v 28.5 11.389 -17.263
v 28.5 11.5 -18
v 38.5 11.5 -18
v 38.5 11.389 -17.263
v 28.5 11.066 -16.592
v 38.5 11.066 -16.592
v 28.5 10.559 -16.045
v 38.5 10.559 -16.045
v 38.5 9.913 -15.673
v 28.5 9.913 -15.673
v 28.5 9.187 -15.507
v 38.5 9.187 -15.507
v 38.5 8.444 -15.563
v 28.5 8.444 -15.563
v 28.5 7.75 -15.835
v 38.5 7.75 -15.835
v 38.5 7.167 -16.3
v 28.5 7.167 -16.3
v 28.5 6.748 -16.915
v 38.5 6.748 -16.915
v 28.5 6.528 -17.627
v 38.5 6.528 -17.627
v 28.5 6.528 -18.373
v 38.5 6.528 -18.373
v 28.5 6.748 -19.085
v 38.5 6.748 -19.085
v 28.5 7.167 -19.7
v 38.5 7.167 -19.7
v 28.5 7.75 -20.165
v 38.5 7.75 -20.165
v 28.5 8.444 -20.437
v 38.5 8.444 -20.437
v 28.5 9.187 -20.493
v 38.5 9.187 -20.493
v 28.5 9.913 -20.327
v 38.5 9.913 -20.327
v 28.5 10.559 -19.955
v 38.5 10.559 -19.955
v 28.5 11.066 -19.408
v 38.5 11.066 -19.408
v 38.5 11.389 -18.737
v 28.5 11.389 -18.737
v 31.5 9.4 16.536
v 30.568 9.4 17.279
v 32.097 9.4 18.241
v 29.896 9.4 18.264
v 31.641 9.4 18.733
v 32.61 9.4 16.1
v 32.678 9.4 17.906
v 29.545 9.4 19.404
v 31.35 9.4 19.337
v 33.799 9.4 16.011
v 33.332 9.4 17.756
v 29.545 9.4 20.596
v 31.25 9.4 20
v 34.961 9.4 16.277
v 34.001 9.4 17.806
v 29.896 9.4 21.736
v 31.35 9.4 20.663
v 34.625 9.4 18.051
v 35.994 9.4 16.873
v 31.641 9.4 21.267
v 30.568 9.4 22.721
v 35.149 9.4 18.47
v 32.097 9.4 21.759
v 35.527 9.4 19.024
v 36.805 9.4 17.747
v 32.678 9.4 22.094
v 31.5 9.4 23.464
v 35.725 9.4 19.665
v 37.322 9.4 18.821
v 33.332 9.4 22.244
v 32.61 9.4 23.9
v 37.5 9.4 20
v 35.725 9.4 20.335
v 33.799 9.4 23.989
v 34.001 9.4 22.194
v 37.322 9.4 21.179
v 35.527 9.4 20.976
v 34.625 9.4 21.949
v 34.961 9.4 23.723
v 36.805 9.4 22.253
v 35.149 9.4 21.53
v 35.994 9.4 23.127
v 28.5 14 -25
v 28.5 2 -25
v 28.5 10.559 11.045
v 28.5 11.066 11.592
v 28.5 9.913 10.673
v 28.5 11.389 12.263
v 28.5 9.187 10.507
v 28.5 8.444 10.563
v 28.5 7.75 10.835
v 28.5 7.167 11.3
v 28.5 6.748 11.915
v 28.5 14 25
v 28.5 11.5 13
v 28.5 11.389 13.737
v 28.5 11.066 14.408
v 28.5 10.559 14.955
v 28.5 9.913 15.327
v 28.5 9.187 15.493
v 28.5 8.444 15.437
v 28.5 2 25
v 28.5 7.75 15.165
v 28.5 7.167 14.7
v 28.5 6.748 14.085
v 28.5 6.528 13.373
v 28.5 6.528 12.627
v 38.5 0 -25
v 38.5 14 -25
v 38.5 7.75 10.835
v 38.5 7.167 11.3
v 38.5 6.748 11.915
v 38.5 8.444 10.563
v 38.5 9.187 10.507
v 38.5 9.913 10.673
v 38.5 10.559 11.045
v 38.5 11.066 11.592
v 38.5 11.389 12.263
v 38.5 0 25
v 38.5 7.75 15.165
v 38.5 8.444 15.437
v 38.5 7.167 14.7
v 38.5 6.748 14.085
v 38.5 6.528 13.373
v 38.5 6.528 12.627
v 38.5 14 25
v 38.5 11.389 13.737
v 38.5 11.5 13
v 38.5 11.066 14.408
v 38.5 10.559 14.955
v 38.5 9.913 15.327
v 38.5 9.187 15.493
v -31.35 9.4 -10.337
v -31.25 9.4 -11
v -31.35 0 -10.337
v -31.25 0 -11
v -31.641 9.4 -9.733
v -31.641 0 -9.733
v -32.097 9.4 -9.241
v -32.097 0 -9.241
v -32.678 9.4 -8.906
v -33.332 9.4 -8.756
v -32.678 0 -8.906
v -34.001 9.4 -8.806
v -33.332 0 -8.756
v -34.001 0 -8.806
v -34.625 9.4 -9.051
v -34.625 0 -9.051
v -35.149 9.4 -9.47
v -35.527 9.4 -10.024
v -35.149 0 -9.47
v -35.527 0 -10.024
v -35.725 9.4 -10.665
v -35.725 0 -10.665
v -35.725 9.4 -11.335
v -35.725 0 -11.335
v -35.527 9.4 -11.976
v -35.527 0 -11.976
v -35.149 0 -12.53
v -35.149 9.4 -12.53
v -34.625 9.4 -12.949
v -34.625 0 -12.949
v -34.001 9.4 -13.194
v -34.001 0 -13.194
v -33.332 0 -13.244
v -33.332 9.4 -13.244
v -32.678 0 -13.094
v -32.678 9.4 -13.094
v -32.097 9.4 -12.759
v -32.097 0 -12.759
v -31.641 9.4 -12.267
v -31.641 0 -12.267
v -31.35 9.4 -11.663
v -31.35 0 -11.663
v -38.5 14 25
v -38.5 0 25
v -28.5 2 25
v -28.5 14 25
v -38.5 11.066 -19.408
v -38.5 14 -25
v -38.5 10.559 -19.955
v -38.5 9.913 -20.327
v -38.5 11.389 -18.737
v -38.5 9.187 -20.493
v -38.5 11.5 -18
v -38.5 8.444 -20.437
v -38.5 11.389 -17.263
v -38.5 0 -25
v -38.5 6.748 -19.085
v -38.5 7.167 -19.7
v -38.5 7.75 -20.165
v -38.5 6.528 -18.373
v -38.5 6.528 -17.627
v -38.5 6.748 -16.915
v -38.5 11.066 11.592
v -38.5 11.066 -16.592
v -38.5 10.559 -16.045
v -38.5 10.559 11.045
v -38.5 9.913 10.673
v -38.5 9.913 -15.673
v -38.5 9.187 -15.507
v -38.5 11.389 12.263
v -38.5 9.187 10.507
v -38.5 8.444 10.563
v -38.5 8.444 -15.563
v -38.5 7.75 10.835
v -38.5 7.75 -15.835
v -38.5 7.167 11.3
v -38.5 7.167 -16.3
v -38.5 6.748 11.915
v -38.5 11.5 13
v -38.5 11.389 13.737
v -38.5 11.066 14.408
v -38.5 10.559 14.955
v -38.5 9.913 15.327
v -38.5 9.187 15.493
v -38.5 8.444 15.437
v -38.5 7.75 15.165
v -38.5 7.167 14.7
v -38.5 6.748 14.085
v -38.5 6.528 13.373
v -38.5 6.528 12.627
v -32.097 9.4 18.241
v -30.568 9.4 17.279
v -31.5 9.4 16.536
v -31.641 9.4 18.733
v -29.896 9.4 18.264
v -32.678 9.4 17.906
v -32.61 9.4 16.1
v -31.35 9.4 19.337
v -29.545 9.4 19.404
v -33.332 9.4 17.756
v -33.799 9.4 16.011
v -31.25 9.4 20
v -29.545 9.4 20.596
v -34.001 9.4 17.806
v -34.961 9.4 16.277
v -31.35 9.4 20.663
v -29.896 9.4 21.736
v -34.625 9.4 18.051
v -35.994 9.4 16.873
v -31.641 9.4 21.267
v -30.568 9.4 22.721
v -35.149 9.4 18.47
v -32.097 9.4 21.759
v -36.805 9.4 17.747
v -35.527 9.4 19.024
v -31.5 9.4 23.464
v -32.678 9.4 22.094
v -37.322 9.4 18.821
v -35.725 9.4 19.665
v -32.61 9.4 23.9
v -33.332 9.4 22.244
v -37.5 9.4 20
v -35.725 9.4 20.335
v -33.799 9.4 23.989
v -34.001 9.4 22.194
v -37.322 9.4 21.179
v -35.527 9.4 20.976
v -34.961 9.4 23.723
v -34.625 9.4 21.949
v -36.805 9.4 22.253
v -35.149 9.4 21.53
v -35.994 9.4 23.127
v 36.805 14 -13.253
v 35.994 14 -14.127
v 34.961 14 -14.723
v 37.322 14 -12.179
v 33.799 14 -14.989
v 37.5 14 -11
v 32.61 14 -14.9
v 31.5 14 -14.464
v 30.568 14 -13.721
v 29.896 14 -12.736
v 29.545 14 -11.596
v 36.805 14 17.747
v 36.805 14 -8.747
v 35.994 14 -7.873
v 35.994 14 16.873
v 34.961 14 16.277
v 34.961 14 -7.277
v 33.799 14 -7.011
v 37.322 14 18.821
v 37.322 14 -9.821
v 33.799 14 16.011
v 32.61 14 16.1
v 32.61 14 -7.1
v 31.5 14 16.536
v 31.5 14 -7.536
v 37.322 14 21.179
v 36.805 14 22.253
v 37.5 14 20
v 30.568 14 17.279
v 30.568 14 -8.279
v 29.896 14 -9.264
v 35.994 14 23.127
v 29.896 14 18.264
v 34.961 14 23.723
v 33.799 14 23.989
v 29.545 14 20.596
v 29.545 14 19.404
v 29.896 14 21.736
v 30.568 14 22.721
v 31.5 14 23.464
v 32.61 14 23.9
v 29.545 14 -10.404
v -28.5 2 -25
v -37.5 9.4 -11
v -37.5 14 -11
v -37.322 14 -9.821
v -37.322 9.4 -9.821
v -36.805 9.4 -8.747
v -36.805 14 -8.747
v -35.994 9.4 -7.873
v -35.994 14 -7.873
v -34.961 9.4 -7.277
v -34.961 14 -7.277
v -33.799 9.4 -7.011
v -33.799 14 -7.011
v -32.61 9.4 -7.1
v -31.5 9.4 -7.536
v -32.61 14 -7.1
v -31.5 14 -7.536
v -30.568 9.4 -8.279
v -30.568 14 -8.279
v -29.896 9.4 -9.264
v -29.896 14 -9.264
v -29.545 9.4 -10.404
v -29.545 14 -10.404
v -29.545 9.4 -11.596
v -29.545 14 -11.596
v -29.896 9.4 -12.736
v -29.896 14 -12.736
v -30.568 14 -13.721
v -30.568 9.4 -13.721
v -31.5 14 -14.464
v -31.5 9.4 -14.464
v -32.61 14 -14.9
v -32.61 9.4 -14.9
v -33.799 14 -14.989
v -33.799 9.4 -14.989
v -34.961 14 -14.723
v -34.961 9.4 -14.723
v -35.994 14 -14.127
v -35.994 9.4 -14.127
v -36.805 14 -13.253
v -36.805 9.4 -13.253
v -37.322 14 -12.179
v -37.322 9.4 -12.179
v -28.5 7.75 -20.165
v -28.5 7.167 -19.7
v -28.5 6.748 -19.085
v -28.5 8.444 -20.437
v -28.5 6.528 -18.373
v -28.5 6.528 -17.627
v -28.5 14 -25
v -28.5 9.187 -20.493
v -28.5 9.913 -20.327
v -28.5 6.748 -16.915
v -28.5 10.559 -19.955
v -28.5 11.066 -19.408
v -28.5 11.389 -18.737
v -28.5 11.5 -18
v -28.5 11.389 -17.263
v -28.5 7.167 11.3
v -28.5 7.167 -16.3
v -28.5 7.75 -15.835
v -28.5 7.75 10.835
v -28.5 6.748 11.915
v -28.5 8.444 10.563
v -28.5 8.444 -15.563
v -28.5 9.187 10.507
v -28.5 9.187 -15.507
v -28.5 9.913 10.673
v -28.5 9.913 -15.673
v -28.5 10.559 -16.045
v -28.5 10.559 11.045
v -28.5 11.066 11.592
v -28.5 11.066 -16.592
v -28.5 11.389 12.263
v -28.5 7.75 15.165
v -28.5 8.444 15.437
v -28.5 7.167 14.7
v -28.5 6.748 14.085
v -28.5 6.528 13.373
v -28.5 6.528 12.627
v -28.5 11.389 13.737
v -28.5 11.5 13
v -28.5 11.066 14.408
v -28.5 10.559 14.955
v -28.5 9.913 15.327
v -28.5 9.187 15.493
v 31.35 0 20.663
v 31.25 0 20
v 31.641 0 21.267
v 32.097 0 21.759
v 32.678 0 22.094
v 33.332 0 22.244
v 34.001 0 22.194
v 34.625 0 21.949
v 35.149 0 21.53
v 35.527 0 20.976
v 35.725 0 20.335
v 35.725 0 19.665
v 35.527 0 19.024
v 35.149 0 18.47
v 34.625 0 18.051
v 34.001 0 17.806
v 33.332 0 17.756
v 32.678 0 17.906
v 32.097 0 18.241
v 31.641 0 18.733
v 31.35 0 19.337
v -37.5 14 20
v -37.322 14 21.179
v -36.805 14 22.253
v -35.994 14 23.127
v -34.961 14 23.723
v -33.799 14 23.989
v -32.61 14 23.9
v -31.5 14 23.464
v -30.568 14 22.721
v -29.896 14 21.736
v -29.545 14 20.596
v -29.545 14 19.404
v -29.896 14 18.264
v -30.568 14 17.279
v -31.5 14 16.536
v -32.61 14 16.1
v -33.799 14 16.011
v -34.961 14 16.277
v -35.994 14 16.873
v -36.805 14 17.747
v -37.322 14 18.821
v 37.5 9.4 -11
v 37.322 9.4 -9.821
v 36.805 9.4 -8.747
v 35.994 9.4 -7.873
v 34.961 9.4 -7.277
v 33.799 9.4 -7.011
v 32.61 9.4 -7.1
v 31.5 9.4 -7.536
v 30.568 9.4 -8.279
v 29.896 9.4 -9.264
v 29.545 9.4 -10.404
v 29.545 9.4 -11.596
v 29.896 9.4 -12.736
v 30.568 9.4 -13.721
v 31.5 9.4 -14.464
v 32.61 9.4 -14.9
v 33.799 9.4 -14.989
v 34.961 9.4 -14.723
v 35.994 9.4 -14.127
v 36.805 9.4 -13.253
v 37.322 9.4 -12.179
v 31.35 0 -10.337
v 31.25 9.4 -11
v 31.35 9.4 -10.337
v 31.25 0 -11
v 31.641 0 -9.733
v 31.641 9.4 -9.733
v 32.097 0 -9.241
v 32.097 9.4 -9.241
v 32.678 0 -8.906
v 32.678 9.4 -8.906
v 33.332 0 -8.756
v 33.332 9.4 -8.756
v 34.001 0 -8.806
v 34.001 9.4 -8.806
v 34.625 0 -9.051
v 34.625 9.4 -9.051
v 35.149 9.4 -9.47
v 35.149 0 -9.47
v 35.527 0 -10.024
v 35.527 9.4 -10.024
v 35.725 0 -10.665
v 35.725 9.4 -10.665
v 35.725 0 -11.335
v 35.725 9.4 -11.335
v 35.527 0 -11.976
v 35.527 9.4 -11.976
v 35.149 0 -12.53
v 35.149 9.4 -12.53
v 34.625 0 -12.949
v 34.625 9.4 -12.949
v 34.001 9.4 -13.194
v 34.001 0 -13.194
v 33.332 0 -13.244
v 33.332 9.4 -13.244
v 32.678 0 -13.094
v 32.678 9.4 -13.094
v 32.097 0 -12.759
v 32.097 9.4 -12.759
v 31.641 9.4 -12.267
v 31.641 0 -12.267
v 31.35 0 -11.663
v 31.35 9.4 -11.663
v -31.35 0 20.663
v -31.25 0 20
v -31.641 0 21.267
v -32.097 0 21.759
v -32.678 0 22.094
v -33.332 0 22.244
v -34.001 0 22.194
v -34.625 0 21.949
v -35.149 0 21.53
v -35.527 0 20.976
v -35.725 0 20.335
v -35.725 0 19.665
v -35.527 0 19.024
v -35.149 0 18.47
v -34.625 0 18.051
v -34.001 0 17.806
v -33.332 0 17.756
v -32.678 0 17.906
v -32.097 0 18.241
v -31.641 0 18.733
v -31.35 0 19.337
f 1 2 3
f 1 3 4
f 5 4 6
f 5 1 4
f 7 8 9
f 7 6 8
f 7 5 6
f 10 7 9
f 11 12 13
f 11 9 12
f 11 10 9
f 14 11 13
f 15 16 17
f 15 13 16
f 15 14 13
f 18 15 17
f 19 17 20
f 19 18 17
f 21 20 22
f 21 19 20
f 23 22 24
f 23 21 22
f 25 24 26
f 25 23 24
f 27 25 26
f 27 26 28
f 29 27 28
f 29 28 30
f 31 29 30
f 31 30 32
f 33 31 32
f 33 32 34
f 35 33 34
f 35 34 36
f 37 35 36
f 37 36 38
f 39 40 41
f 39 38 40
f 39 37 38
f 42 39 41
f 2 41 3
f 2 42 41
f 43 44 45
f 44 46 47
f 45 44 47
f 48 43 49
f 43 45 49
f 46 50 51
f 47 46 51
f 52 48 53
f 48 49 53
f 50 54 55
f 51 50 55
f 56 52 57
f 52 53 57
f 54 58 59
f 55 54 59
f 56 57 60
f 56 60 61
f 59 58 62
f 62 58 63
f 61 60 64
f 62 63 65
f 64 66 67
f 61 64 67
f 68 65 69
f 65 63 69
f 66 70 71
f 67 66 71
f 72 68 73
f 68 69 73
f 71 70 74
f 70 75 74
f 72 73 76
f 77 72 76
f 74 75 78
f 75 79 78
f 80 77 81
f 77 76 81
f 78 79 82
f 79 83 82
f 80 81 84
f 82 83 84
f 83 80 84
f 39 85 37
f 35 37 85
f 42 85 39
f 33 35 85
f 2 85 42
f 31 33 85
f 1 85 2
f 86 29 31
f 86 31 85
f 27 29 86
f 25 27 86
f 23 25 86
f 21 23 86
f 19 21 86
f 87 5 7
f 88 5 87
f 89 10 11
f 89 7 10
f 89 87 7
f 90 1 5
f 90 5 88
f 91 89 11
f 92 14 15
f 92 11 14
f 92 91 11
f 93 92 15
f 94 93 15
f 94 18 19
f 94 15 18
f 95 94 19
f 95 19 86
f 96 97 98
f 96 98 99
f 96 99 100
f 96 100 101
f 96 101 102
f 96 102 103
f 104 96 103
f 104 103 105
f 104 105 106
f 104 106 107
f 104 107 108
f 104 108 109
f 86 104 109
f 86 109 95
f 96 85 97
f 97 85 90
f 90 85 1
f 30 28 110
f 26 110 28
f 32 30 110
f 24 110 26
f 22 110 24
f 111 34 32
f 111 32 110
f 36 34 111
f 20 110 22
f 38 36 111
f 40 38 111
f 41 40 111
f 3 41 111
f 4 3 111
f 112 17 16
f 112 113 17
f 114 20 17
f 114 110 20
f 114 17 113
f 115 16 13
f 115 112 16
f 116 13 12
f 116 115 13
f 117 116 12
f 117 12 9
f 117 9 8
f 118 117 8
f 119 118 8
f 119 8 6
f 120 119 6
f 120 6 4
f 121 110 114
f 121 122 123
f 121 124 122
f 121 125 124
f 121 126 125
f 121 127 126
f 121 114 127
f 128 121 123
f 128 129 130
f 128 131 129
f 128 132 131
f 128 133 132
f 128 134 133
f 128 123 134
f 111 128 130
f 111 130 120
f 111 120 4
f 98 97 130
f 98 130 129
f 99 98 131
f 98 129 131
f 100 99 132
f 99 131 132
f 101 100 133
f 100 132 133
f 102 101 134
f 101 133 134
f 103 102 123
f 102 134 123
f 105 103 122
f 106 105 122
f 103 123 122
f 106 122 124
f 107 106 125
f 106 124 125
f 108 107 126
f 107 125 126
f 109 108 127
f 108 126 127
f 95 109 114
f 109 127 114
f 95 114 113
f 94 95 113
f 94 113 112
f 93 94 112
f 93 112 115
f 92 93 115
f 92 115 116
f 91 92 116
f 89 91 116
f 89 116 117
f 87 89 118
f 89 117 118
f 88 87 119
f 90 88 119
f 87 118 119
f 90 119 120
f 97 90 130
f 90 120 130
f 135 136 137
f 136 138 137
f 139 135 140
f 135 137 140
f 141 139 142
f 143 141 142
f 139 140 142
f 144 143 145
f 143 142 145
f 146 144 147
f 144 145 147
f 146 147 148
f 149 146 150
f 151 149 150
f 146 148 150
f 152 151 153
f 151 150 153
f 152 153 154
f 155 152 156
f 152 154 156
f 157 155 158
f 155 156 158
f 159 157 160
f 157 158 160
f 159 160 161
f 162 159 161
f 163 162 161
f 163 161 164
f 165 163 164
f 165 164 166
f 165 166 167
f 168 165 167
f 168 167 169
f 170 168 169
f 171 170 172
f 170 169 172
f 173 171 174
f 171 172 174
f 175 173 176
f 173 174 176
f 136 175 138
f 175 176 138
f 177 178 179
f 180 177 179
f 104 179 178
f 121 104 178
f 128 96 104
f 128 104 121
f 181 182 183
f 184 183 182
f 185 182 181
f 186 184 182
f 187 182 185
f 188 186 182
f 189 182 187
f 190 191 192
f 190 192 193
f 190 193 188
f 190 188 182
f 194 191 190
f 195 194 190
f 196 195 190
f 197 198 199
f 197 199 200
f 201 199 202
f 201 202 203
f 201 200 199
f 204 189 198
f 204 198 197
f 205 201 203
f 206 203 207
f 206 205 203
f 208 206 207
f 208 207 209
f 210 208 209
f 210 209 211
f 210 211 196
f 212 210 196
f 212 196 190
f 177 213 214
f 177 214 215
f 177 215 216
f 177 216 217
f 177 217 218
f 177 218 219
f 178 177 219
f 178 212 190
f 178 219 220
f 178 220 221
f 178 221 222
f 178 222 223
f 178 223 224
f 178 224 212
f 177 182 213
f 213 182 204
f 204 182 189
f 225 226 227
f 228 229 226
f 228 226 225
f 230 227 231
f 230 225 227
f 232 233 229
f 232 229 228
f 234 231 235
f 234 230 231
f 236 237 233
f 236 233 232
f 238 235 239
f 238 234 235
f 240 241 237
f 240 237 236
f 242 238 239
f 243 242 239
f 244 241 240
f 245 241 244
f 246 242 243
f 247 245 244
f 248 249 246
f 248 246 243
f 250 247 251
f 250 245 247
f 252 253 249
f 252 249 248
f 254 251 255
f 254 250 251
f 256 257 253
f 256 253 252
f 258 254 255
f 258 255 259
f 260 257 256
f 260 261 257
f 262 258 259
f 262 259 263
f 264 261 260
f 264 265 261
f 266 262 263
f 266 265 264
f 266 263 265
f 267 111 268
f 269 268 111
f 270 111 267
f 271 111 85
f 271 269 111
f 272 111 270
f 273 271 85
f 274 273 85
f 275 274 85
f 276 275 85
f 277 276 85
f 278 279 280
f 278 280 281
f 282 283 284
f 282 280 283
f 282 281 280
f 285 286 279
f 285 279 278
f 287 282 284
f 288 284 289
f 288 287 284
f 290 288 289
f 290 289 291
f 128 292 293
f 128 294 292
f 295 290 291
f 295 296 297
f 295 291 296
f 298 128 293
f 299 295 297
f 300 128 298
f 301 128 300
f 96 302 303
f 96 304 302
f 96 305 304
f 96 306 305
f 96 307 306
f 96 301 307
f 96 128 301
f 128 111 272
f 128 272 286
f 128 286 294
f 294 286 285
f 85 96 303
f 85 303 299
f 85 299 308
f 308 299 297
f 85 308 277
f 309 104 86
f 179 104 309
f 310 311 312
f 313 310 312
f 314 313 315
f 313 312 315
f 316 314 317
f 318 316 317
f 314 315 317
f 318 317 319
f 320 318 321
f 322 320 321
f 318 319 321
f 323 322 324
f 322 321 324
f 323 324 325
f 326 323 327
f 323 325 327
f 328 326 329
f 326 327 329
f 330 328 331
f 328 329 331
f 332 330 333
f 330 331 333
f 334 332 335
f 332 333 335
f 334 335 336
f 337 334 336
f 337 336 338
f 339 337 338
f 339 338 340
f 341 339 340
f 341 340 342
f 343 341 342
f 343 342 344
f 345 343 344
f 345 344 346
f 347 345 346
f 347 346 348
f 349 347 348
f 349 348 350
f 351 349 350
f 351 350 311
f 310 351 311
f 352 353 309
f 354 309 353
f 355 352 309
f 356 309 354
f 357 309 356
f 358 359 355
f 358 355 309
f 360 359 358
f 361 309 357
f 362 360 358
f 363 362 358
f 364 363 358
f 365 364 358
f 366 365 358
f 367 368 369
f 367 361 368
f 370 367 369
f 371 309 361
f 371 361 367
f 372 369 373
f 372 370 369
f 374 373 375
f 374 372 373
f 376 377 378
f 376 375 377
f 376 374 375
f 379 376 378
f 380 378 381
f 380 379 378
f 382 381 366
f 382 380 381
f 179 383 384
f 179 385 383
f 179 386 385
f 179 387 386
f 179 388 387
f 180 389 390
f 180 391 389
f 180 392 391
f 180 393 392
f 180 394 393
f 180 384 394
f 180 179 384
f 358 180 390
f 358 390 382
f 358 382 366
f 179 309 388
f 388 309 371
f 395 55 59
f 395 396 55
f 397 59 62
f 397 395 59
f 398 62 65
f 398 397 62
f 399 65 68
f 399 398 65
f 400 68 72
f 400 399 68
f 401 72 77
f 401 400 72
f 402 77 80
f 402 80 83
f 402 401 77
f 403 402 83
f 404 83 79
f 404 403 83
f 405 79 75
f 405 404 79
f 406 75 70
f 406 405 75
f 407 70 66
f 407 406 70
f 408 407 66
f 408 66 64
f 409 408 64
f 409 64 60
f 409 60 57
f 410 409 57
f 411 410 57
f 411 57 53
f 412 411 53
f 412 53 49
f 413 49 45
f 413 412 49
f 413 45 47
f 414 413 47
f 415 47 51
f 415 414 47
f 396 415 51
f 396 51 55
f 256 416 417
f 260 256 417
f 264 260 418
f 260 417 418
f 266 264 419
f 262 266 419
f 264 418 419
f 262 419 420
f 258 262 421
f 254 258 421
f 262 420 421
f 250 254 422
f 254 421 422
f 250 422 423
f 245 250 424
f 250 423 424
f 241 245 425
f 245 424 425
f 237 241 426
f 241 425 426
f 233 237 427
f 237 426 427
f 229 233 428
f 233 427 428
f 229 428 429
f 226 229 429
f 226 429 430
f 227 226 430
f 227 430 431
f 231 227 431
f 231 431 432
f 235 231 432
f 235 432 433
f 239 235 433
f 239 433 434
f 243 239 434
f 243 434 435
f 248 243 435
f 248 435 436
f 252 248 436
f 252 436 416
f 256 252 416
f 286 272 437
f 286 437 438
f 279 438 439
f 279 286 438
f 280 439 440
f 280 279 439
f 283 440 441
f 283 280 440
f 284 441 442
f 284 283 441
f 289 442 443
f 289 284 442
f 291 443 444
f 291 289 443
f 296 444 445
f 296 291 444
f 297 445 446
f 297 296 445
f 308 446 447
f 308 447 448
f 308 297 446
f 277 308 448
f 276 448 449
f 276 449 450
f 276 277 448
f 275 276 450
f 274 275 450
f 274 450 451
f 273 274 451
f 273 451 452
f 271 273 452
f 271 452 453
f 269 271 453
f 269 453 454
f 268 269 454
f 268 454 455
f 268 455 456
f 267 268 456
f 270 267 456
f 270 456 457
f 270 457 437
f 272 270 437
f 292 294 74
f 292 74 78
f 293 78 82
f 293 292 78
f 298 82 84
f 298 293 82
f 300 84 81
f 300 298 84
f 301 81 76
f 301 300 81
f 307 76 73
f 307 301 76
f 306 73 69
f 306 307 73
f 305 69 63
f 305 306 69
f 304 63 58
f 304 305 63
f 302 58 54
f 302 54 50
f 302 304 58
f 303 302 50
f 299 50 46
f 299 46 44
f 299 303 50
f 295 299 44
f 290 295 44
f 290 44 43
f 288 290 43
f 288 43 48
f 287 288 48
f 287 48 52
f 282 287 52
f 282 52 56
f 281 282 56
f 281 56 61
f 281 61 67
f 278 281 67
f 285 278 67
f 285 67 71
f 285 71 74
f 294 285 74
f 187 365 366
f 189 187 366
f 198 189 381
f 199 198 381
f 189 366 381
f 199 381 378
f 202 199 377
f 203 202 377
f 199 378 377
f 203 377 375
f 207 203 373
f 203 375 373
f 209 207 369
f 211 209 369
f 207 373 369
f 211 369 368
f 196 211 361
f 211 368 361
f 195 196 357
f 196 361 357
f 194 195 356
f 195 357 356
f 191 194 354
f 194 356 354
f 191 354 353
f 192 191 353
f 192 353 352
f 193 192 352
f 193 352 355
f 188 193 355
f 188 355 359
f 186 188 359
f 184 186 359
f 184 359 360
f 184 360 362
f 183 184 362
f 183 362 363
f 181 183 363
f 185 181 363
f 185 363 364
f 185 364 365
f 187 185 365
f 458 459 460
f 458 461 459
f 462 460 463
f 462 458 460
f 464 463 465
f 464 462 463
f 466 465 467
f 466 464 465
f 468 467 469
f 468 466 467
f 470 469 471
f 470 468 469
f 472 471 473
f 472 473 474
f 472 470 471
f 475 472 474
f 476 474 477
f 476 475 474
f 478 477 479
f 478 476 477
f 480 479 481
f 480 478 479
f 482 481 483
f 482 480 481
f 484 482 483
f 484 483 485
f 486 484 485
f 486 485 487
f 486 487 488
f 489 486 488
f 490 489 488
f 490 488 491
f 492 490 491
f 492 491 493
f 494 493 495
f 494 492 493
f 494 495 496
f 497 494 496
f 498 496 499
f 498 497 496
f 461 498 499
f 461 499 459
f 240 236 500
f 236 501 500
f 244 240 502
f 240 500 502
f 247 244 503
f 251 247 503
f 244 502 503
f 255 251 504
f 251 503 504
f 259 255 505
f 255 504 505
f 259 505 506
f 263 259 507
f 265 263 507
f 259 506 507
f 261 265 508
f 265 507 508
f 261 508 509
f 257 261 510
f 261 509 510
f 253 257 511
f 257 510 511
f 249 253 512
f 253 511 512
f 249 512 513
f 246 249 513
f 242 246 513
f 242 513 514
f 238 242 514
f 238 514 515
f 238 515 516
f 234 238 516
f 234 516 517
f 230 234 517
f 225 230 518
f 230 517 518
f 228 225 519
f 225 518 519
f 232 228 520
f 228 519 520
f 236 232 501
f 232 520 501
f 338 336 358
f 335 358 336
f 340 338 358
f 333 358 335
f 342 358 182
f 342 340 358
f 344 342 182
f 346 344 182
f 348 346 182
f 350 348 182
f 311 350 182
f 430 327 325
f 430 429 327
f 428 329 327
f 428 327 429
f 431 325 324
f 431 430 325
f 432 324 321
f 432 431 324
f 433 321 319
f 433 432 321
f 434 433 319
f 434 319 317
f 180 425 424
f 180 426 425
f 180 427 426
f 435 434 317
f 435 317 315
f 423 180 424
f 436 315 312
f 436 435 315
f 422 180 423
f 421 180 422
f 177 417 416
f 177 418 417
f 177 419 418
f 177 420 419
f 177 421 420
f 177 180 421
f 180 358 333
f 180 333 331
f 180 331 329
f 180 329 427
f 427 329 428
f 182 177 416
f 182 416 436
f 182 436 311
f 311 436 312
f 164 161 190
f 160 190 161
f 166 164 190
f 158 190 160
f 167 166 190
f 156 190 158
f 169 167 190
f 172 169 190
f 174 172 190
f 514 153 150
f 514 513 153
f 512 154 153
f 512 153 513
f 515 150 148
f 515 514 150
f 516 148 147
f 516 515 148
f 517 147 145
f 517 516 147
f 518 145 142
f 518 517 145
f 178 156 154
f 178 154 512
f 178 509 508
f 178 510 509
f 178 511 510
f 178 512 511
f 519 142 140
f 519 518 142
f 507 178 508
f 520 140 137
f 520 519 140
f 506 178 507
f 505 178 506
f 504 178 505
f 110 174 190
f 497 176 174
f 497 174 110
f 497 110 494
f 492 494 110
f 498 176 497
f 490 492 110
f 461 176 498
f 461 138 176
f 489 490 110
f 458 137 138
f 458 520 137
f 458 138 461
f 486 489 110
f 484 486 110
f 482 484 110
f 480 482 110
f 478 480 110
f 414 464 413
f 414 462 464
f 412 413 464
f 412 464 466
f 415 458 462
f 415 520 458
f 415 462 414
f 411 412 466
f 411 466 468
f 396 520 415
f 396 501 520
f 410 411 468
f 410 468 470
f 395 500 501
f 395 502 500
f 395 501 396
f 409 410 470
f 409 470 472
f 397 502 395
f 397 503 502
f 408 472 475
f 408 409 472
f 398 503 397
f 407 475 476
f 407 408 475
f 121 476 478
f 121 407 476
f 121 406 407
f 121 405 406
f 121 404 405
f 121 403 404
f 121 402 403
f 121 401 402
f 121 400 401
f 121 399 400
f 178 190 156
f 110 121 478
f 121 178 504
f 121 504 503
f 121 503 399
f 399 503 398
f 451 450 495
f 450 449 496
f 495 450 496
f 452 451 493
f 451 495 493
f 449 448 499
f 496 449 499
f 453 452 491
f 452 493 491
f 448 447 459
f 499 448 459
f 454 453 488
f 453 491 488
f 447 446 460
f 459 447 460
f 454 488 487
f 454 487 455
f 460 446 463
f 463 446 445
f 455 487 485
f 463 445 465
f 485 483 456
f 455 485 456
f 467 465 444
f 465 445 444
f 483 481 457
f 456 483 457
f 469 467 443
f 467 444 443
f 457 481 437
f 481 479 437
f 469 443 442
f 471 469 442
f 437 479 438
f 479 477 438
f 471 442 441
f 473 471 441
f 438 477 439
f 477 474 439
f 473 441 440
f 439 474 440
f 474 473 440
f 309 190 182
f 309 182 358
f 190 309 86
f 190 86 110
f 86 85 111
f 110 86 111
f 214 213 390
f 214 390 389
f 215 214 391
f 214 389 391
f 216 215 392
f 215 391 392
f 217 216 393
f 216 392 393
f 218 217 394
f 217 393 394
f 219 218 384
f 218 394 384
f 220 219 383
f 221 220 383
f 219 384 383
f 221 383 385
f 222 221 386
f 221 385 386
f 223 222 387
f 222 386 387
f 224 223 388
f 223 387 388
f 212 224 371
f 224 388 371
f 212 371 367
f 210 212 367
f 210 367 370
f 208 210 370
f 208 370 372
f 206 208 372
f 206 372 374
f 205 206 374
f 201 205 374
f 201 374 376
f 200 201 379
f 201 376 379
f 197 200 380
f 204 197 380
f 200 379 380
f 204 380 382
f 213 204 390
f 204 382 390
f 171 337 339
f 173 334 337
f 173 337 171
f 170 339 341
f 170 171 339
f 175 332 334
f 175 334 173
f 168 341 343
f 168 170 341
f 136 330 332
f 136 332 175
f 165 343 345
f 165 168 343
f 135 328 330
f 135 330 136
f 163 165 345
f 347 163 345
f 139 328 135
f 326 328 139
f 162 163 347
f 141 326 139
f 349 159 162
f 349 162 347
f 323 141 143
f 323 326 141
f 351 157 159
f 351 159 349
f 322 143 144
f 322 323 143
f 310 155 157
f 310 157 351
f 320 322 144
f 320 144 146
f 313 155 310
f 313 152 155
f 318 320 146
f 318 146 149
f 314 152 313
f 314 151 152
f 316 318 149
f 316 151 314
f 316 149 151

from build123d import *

# Parameters (mm, degrees)
EXTRUDE_1_DEPTH           = 25
SKETCH_4_R                = 2.5
CUT_EXTRUDE_1_DEPTH       = 50
HOLE_WIZARD_2_D           = 4.5
HOLE_WIZARD_2_CBORE_D     = 8
HOLE_WIZARD_2_CBORE_DEPTH = 4.6


with BuildPart() as part:
    # 草图1 → 凸台-拉伸1 (new, symmetric)
    with BuildSketch(Plane.XY):
        Polygon((-28.5, 2), (-28.5, 14), (-38.5, 14), (-38.5, 0), (38.5, 0), (38.5, 14), (28.5, 14), (28.5, 2), align=None)
    extrude(amount=EXTRUDE_1_DEPTH, both=True)

    # 草图4 → 切除-拉伸1 (cut, symmetric)
    with BuildSketch(Plane(origin=(0, 0, 0), x_dir=(0, 0, -1), z_dir=(1, 0, 0))):
        with Locations(Location((18, 9, 0), (0, 0, 90))):
            Circle(SKETCH_4_R)
        with Locations(Location((-13, 9, 0), (0, 0, 90))):
            Circle(SKETCH_4_R)
    extrude(amount=CUT_EXTRUDE_1_DEPTH, both=True, mode=Mode.SUBTRACT)

    # 打孔尺寸根据内六角圆柱头螺钉的类型2 (through all)
    with Locations(Plane(origin=(0, 14, 0), x_dir=(-1, 0, 0), z_dir=(0, 1, 0))):
        with Locations((33.5, -11), (33.5, 20)):
            hole_wizard_2 = CounterBoreHole(HOLE_WIZARD_2_D / 2, HOLE_WIZARD_2_CBORE_D / 2, HOLE_WIZARD_2_CBORE_DEPTH)

    # 镜向2: 打孔尺寸根据内六角圆柱头螺钉的类型2 across plane
    add(hole_wizard_2.mirror(Plane(origin=(0, 0, 0), x_dir=(0, 0, 1), z_dir=(1, 0, 0))), mode=Mode.SUBTRACT)


solid = part.part
